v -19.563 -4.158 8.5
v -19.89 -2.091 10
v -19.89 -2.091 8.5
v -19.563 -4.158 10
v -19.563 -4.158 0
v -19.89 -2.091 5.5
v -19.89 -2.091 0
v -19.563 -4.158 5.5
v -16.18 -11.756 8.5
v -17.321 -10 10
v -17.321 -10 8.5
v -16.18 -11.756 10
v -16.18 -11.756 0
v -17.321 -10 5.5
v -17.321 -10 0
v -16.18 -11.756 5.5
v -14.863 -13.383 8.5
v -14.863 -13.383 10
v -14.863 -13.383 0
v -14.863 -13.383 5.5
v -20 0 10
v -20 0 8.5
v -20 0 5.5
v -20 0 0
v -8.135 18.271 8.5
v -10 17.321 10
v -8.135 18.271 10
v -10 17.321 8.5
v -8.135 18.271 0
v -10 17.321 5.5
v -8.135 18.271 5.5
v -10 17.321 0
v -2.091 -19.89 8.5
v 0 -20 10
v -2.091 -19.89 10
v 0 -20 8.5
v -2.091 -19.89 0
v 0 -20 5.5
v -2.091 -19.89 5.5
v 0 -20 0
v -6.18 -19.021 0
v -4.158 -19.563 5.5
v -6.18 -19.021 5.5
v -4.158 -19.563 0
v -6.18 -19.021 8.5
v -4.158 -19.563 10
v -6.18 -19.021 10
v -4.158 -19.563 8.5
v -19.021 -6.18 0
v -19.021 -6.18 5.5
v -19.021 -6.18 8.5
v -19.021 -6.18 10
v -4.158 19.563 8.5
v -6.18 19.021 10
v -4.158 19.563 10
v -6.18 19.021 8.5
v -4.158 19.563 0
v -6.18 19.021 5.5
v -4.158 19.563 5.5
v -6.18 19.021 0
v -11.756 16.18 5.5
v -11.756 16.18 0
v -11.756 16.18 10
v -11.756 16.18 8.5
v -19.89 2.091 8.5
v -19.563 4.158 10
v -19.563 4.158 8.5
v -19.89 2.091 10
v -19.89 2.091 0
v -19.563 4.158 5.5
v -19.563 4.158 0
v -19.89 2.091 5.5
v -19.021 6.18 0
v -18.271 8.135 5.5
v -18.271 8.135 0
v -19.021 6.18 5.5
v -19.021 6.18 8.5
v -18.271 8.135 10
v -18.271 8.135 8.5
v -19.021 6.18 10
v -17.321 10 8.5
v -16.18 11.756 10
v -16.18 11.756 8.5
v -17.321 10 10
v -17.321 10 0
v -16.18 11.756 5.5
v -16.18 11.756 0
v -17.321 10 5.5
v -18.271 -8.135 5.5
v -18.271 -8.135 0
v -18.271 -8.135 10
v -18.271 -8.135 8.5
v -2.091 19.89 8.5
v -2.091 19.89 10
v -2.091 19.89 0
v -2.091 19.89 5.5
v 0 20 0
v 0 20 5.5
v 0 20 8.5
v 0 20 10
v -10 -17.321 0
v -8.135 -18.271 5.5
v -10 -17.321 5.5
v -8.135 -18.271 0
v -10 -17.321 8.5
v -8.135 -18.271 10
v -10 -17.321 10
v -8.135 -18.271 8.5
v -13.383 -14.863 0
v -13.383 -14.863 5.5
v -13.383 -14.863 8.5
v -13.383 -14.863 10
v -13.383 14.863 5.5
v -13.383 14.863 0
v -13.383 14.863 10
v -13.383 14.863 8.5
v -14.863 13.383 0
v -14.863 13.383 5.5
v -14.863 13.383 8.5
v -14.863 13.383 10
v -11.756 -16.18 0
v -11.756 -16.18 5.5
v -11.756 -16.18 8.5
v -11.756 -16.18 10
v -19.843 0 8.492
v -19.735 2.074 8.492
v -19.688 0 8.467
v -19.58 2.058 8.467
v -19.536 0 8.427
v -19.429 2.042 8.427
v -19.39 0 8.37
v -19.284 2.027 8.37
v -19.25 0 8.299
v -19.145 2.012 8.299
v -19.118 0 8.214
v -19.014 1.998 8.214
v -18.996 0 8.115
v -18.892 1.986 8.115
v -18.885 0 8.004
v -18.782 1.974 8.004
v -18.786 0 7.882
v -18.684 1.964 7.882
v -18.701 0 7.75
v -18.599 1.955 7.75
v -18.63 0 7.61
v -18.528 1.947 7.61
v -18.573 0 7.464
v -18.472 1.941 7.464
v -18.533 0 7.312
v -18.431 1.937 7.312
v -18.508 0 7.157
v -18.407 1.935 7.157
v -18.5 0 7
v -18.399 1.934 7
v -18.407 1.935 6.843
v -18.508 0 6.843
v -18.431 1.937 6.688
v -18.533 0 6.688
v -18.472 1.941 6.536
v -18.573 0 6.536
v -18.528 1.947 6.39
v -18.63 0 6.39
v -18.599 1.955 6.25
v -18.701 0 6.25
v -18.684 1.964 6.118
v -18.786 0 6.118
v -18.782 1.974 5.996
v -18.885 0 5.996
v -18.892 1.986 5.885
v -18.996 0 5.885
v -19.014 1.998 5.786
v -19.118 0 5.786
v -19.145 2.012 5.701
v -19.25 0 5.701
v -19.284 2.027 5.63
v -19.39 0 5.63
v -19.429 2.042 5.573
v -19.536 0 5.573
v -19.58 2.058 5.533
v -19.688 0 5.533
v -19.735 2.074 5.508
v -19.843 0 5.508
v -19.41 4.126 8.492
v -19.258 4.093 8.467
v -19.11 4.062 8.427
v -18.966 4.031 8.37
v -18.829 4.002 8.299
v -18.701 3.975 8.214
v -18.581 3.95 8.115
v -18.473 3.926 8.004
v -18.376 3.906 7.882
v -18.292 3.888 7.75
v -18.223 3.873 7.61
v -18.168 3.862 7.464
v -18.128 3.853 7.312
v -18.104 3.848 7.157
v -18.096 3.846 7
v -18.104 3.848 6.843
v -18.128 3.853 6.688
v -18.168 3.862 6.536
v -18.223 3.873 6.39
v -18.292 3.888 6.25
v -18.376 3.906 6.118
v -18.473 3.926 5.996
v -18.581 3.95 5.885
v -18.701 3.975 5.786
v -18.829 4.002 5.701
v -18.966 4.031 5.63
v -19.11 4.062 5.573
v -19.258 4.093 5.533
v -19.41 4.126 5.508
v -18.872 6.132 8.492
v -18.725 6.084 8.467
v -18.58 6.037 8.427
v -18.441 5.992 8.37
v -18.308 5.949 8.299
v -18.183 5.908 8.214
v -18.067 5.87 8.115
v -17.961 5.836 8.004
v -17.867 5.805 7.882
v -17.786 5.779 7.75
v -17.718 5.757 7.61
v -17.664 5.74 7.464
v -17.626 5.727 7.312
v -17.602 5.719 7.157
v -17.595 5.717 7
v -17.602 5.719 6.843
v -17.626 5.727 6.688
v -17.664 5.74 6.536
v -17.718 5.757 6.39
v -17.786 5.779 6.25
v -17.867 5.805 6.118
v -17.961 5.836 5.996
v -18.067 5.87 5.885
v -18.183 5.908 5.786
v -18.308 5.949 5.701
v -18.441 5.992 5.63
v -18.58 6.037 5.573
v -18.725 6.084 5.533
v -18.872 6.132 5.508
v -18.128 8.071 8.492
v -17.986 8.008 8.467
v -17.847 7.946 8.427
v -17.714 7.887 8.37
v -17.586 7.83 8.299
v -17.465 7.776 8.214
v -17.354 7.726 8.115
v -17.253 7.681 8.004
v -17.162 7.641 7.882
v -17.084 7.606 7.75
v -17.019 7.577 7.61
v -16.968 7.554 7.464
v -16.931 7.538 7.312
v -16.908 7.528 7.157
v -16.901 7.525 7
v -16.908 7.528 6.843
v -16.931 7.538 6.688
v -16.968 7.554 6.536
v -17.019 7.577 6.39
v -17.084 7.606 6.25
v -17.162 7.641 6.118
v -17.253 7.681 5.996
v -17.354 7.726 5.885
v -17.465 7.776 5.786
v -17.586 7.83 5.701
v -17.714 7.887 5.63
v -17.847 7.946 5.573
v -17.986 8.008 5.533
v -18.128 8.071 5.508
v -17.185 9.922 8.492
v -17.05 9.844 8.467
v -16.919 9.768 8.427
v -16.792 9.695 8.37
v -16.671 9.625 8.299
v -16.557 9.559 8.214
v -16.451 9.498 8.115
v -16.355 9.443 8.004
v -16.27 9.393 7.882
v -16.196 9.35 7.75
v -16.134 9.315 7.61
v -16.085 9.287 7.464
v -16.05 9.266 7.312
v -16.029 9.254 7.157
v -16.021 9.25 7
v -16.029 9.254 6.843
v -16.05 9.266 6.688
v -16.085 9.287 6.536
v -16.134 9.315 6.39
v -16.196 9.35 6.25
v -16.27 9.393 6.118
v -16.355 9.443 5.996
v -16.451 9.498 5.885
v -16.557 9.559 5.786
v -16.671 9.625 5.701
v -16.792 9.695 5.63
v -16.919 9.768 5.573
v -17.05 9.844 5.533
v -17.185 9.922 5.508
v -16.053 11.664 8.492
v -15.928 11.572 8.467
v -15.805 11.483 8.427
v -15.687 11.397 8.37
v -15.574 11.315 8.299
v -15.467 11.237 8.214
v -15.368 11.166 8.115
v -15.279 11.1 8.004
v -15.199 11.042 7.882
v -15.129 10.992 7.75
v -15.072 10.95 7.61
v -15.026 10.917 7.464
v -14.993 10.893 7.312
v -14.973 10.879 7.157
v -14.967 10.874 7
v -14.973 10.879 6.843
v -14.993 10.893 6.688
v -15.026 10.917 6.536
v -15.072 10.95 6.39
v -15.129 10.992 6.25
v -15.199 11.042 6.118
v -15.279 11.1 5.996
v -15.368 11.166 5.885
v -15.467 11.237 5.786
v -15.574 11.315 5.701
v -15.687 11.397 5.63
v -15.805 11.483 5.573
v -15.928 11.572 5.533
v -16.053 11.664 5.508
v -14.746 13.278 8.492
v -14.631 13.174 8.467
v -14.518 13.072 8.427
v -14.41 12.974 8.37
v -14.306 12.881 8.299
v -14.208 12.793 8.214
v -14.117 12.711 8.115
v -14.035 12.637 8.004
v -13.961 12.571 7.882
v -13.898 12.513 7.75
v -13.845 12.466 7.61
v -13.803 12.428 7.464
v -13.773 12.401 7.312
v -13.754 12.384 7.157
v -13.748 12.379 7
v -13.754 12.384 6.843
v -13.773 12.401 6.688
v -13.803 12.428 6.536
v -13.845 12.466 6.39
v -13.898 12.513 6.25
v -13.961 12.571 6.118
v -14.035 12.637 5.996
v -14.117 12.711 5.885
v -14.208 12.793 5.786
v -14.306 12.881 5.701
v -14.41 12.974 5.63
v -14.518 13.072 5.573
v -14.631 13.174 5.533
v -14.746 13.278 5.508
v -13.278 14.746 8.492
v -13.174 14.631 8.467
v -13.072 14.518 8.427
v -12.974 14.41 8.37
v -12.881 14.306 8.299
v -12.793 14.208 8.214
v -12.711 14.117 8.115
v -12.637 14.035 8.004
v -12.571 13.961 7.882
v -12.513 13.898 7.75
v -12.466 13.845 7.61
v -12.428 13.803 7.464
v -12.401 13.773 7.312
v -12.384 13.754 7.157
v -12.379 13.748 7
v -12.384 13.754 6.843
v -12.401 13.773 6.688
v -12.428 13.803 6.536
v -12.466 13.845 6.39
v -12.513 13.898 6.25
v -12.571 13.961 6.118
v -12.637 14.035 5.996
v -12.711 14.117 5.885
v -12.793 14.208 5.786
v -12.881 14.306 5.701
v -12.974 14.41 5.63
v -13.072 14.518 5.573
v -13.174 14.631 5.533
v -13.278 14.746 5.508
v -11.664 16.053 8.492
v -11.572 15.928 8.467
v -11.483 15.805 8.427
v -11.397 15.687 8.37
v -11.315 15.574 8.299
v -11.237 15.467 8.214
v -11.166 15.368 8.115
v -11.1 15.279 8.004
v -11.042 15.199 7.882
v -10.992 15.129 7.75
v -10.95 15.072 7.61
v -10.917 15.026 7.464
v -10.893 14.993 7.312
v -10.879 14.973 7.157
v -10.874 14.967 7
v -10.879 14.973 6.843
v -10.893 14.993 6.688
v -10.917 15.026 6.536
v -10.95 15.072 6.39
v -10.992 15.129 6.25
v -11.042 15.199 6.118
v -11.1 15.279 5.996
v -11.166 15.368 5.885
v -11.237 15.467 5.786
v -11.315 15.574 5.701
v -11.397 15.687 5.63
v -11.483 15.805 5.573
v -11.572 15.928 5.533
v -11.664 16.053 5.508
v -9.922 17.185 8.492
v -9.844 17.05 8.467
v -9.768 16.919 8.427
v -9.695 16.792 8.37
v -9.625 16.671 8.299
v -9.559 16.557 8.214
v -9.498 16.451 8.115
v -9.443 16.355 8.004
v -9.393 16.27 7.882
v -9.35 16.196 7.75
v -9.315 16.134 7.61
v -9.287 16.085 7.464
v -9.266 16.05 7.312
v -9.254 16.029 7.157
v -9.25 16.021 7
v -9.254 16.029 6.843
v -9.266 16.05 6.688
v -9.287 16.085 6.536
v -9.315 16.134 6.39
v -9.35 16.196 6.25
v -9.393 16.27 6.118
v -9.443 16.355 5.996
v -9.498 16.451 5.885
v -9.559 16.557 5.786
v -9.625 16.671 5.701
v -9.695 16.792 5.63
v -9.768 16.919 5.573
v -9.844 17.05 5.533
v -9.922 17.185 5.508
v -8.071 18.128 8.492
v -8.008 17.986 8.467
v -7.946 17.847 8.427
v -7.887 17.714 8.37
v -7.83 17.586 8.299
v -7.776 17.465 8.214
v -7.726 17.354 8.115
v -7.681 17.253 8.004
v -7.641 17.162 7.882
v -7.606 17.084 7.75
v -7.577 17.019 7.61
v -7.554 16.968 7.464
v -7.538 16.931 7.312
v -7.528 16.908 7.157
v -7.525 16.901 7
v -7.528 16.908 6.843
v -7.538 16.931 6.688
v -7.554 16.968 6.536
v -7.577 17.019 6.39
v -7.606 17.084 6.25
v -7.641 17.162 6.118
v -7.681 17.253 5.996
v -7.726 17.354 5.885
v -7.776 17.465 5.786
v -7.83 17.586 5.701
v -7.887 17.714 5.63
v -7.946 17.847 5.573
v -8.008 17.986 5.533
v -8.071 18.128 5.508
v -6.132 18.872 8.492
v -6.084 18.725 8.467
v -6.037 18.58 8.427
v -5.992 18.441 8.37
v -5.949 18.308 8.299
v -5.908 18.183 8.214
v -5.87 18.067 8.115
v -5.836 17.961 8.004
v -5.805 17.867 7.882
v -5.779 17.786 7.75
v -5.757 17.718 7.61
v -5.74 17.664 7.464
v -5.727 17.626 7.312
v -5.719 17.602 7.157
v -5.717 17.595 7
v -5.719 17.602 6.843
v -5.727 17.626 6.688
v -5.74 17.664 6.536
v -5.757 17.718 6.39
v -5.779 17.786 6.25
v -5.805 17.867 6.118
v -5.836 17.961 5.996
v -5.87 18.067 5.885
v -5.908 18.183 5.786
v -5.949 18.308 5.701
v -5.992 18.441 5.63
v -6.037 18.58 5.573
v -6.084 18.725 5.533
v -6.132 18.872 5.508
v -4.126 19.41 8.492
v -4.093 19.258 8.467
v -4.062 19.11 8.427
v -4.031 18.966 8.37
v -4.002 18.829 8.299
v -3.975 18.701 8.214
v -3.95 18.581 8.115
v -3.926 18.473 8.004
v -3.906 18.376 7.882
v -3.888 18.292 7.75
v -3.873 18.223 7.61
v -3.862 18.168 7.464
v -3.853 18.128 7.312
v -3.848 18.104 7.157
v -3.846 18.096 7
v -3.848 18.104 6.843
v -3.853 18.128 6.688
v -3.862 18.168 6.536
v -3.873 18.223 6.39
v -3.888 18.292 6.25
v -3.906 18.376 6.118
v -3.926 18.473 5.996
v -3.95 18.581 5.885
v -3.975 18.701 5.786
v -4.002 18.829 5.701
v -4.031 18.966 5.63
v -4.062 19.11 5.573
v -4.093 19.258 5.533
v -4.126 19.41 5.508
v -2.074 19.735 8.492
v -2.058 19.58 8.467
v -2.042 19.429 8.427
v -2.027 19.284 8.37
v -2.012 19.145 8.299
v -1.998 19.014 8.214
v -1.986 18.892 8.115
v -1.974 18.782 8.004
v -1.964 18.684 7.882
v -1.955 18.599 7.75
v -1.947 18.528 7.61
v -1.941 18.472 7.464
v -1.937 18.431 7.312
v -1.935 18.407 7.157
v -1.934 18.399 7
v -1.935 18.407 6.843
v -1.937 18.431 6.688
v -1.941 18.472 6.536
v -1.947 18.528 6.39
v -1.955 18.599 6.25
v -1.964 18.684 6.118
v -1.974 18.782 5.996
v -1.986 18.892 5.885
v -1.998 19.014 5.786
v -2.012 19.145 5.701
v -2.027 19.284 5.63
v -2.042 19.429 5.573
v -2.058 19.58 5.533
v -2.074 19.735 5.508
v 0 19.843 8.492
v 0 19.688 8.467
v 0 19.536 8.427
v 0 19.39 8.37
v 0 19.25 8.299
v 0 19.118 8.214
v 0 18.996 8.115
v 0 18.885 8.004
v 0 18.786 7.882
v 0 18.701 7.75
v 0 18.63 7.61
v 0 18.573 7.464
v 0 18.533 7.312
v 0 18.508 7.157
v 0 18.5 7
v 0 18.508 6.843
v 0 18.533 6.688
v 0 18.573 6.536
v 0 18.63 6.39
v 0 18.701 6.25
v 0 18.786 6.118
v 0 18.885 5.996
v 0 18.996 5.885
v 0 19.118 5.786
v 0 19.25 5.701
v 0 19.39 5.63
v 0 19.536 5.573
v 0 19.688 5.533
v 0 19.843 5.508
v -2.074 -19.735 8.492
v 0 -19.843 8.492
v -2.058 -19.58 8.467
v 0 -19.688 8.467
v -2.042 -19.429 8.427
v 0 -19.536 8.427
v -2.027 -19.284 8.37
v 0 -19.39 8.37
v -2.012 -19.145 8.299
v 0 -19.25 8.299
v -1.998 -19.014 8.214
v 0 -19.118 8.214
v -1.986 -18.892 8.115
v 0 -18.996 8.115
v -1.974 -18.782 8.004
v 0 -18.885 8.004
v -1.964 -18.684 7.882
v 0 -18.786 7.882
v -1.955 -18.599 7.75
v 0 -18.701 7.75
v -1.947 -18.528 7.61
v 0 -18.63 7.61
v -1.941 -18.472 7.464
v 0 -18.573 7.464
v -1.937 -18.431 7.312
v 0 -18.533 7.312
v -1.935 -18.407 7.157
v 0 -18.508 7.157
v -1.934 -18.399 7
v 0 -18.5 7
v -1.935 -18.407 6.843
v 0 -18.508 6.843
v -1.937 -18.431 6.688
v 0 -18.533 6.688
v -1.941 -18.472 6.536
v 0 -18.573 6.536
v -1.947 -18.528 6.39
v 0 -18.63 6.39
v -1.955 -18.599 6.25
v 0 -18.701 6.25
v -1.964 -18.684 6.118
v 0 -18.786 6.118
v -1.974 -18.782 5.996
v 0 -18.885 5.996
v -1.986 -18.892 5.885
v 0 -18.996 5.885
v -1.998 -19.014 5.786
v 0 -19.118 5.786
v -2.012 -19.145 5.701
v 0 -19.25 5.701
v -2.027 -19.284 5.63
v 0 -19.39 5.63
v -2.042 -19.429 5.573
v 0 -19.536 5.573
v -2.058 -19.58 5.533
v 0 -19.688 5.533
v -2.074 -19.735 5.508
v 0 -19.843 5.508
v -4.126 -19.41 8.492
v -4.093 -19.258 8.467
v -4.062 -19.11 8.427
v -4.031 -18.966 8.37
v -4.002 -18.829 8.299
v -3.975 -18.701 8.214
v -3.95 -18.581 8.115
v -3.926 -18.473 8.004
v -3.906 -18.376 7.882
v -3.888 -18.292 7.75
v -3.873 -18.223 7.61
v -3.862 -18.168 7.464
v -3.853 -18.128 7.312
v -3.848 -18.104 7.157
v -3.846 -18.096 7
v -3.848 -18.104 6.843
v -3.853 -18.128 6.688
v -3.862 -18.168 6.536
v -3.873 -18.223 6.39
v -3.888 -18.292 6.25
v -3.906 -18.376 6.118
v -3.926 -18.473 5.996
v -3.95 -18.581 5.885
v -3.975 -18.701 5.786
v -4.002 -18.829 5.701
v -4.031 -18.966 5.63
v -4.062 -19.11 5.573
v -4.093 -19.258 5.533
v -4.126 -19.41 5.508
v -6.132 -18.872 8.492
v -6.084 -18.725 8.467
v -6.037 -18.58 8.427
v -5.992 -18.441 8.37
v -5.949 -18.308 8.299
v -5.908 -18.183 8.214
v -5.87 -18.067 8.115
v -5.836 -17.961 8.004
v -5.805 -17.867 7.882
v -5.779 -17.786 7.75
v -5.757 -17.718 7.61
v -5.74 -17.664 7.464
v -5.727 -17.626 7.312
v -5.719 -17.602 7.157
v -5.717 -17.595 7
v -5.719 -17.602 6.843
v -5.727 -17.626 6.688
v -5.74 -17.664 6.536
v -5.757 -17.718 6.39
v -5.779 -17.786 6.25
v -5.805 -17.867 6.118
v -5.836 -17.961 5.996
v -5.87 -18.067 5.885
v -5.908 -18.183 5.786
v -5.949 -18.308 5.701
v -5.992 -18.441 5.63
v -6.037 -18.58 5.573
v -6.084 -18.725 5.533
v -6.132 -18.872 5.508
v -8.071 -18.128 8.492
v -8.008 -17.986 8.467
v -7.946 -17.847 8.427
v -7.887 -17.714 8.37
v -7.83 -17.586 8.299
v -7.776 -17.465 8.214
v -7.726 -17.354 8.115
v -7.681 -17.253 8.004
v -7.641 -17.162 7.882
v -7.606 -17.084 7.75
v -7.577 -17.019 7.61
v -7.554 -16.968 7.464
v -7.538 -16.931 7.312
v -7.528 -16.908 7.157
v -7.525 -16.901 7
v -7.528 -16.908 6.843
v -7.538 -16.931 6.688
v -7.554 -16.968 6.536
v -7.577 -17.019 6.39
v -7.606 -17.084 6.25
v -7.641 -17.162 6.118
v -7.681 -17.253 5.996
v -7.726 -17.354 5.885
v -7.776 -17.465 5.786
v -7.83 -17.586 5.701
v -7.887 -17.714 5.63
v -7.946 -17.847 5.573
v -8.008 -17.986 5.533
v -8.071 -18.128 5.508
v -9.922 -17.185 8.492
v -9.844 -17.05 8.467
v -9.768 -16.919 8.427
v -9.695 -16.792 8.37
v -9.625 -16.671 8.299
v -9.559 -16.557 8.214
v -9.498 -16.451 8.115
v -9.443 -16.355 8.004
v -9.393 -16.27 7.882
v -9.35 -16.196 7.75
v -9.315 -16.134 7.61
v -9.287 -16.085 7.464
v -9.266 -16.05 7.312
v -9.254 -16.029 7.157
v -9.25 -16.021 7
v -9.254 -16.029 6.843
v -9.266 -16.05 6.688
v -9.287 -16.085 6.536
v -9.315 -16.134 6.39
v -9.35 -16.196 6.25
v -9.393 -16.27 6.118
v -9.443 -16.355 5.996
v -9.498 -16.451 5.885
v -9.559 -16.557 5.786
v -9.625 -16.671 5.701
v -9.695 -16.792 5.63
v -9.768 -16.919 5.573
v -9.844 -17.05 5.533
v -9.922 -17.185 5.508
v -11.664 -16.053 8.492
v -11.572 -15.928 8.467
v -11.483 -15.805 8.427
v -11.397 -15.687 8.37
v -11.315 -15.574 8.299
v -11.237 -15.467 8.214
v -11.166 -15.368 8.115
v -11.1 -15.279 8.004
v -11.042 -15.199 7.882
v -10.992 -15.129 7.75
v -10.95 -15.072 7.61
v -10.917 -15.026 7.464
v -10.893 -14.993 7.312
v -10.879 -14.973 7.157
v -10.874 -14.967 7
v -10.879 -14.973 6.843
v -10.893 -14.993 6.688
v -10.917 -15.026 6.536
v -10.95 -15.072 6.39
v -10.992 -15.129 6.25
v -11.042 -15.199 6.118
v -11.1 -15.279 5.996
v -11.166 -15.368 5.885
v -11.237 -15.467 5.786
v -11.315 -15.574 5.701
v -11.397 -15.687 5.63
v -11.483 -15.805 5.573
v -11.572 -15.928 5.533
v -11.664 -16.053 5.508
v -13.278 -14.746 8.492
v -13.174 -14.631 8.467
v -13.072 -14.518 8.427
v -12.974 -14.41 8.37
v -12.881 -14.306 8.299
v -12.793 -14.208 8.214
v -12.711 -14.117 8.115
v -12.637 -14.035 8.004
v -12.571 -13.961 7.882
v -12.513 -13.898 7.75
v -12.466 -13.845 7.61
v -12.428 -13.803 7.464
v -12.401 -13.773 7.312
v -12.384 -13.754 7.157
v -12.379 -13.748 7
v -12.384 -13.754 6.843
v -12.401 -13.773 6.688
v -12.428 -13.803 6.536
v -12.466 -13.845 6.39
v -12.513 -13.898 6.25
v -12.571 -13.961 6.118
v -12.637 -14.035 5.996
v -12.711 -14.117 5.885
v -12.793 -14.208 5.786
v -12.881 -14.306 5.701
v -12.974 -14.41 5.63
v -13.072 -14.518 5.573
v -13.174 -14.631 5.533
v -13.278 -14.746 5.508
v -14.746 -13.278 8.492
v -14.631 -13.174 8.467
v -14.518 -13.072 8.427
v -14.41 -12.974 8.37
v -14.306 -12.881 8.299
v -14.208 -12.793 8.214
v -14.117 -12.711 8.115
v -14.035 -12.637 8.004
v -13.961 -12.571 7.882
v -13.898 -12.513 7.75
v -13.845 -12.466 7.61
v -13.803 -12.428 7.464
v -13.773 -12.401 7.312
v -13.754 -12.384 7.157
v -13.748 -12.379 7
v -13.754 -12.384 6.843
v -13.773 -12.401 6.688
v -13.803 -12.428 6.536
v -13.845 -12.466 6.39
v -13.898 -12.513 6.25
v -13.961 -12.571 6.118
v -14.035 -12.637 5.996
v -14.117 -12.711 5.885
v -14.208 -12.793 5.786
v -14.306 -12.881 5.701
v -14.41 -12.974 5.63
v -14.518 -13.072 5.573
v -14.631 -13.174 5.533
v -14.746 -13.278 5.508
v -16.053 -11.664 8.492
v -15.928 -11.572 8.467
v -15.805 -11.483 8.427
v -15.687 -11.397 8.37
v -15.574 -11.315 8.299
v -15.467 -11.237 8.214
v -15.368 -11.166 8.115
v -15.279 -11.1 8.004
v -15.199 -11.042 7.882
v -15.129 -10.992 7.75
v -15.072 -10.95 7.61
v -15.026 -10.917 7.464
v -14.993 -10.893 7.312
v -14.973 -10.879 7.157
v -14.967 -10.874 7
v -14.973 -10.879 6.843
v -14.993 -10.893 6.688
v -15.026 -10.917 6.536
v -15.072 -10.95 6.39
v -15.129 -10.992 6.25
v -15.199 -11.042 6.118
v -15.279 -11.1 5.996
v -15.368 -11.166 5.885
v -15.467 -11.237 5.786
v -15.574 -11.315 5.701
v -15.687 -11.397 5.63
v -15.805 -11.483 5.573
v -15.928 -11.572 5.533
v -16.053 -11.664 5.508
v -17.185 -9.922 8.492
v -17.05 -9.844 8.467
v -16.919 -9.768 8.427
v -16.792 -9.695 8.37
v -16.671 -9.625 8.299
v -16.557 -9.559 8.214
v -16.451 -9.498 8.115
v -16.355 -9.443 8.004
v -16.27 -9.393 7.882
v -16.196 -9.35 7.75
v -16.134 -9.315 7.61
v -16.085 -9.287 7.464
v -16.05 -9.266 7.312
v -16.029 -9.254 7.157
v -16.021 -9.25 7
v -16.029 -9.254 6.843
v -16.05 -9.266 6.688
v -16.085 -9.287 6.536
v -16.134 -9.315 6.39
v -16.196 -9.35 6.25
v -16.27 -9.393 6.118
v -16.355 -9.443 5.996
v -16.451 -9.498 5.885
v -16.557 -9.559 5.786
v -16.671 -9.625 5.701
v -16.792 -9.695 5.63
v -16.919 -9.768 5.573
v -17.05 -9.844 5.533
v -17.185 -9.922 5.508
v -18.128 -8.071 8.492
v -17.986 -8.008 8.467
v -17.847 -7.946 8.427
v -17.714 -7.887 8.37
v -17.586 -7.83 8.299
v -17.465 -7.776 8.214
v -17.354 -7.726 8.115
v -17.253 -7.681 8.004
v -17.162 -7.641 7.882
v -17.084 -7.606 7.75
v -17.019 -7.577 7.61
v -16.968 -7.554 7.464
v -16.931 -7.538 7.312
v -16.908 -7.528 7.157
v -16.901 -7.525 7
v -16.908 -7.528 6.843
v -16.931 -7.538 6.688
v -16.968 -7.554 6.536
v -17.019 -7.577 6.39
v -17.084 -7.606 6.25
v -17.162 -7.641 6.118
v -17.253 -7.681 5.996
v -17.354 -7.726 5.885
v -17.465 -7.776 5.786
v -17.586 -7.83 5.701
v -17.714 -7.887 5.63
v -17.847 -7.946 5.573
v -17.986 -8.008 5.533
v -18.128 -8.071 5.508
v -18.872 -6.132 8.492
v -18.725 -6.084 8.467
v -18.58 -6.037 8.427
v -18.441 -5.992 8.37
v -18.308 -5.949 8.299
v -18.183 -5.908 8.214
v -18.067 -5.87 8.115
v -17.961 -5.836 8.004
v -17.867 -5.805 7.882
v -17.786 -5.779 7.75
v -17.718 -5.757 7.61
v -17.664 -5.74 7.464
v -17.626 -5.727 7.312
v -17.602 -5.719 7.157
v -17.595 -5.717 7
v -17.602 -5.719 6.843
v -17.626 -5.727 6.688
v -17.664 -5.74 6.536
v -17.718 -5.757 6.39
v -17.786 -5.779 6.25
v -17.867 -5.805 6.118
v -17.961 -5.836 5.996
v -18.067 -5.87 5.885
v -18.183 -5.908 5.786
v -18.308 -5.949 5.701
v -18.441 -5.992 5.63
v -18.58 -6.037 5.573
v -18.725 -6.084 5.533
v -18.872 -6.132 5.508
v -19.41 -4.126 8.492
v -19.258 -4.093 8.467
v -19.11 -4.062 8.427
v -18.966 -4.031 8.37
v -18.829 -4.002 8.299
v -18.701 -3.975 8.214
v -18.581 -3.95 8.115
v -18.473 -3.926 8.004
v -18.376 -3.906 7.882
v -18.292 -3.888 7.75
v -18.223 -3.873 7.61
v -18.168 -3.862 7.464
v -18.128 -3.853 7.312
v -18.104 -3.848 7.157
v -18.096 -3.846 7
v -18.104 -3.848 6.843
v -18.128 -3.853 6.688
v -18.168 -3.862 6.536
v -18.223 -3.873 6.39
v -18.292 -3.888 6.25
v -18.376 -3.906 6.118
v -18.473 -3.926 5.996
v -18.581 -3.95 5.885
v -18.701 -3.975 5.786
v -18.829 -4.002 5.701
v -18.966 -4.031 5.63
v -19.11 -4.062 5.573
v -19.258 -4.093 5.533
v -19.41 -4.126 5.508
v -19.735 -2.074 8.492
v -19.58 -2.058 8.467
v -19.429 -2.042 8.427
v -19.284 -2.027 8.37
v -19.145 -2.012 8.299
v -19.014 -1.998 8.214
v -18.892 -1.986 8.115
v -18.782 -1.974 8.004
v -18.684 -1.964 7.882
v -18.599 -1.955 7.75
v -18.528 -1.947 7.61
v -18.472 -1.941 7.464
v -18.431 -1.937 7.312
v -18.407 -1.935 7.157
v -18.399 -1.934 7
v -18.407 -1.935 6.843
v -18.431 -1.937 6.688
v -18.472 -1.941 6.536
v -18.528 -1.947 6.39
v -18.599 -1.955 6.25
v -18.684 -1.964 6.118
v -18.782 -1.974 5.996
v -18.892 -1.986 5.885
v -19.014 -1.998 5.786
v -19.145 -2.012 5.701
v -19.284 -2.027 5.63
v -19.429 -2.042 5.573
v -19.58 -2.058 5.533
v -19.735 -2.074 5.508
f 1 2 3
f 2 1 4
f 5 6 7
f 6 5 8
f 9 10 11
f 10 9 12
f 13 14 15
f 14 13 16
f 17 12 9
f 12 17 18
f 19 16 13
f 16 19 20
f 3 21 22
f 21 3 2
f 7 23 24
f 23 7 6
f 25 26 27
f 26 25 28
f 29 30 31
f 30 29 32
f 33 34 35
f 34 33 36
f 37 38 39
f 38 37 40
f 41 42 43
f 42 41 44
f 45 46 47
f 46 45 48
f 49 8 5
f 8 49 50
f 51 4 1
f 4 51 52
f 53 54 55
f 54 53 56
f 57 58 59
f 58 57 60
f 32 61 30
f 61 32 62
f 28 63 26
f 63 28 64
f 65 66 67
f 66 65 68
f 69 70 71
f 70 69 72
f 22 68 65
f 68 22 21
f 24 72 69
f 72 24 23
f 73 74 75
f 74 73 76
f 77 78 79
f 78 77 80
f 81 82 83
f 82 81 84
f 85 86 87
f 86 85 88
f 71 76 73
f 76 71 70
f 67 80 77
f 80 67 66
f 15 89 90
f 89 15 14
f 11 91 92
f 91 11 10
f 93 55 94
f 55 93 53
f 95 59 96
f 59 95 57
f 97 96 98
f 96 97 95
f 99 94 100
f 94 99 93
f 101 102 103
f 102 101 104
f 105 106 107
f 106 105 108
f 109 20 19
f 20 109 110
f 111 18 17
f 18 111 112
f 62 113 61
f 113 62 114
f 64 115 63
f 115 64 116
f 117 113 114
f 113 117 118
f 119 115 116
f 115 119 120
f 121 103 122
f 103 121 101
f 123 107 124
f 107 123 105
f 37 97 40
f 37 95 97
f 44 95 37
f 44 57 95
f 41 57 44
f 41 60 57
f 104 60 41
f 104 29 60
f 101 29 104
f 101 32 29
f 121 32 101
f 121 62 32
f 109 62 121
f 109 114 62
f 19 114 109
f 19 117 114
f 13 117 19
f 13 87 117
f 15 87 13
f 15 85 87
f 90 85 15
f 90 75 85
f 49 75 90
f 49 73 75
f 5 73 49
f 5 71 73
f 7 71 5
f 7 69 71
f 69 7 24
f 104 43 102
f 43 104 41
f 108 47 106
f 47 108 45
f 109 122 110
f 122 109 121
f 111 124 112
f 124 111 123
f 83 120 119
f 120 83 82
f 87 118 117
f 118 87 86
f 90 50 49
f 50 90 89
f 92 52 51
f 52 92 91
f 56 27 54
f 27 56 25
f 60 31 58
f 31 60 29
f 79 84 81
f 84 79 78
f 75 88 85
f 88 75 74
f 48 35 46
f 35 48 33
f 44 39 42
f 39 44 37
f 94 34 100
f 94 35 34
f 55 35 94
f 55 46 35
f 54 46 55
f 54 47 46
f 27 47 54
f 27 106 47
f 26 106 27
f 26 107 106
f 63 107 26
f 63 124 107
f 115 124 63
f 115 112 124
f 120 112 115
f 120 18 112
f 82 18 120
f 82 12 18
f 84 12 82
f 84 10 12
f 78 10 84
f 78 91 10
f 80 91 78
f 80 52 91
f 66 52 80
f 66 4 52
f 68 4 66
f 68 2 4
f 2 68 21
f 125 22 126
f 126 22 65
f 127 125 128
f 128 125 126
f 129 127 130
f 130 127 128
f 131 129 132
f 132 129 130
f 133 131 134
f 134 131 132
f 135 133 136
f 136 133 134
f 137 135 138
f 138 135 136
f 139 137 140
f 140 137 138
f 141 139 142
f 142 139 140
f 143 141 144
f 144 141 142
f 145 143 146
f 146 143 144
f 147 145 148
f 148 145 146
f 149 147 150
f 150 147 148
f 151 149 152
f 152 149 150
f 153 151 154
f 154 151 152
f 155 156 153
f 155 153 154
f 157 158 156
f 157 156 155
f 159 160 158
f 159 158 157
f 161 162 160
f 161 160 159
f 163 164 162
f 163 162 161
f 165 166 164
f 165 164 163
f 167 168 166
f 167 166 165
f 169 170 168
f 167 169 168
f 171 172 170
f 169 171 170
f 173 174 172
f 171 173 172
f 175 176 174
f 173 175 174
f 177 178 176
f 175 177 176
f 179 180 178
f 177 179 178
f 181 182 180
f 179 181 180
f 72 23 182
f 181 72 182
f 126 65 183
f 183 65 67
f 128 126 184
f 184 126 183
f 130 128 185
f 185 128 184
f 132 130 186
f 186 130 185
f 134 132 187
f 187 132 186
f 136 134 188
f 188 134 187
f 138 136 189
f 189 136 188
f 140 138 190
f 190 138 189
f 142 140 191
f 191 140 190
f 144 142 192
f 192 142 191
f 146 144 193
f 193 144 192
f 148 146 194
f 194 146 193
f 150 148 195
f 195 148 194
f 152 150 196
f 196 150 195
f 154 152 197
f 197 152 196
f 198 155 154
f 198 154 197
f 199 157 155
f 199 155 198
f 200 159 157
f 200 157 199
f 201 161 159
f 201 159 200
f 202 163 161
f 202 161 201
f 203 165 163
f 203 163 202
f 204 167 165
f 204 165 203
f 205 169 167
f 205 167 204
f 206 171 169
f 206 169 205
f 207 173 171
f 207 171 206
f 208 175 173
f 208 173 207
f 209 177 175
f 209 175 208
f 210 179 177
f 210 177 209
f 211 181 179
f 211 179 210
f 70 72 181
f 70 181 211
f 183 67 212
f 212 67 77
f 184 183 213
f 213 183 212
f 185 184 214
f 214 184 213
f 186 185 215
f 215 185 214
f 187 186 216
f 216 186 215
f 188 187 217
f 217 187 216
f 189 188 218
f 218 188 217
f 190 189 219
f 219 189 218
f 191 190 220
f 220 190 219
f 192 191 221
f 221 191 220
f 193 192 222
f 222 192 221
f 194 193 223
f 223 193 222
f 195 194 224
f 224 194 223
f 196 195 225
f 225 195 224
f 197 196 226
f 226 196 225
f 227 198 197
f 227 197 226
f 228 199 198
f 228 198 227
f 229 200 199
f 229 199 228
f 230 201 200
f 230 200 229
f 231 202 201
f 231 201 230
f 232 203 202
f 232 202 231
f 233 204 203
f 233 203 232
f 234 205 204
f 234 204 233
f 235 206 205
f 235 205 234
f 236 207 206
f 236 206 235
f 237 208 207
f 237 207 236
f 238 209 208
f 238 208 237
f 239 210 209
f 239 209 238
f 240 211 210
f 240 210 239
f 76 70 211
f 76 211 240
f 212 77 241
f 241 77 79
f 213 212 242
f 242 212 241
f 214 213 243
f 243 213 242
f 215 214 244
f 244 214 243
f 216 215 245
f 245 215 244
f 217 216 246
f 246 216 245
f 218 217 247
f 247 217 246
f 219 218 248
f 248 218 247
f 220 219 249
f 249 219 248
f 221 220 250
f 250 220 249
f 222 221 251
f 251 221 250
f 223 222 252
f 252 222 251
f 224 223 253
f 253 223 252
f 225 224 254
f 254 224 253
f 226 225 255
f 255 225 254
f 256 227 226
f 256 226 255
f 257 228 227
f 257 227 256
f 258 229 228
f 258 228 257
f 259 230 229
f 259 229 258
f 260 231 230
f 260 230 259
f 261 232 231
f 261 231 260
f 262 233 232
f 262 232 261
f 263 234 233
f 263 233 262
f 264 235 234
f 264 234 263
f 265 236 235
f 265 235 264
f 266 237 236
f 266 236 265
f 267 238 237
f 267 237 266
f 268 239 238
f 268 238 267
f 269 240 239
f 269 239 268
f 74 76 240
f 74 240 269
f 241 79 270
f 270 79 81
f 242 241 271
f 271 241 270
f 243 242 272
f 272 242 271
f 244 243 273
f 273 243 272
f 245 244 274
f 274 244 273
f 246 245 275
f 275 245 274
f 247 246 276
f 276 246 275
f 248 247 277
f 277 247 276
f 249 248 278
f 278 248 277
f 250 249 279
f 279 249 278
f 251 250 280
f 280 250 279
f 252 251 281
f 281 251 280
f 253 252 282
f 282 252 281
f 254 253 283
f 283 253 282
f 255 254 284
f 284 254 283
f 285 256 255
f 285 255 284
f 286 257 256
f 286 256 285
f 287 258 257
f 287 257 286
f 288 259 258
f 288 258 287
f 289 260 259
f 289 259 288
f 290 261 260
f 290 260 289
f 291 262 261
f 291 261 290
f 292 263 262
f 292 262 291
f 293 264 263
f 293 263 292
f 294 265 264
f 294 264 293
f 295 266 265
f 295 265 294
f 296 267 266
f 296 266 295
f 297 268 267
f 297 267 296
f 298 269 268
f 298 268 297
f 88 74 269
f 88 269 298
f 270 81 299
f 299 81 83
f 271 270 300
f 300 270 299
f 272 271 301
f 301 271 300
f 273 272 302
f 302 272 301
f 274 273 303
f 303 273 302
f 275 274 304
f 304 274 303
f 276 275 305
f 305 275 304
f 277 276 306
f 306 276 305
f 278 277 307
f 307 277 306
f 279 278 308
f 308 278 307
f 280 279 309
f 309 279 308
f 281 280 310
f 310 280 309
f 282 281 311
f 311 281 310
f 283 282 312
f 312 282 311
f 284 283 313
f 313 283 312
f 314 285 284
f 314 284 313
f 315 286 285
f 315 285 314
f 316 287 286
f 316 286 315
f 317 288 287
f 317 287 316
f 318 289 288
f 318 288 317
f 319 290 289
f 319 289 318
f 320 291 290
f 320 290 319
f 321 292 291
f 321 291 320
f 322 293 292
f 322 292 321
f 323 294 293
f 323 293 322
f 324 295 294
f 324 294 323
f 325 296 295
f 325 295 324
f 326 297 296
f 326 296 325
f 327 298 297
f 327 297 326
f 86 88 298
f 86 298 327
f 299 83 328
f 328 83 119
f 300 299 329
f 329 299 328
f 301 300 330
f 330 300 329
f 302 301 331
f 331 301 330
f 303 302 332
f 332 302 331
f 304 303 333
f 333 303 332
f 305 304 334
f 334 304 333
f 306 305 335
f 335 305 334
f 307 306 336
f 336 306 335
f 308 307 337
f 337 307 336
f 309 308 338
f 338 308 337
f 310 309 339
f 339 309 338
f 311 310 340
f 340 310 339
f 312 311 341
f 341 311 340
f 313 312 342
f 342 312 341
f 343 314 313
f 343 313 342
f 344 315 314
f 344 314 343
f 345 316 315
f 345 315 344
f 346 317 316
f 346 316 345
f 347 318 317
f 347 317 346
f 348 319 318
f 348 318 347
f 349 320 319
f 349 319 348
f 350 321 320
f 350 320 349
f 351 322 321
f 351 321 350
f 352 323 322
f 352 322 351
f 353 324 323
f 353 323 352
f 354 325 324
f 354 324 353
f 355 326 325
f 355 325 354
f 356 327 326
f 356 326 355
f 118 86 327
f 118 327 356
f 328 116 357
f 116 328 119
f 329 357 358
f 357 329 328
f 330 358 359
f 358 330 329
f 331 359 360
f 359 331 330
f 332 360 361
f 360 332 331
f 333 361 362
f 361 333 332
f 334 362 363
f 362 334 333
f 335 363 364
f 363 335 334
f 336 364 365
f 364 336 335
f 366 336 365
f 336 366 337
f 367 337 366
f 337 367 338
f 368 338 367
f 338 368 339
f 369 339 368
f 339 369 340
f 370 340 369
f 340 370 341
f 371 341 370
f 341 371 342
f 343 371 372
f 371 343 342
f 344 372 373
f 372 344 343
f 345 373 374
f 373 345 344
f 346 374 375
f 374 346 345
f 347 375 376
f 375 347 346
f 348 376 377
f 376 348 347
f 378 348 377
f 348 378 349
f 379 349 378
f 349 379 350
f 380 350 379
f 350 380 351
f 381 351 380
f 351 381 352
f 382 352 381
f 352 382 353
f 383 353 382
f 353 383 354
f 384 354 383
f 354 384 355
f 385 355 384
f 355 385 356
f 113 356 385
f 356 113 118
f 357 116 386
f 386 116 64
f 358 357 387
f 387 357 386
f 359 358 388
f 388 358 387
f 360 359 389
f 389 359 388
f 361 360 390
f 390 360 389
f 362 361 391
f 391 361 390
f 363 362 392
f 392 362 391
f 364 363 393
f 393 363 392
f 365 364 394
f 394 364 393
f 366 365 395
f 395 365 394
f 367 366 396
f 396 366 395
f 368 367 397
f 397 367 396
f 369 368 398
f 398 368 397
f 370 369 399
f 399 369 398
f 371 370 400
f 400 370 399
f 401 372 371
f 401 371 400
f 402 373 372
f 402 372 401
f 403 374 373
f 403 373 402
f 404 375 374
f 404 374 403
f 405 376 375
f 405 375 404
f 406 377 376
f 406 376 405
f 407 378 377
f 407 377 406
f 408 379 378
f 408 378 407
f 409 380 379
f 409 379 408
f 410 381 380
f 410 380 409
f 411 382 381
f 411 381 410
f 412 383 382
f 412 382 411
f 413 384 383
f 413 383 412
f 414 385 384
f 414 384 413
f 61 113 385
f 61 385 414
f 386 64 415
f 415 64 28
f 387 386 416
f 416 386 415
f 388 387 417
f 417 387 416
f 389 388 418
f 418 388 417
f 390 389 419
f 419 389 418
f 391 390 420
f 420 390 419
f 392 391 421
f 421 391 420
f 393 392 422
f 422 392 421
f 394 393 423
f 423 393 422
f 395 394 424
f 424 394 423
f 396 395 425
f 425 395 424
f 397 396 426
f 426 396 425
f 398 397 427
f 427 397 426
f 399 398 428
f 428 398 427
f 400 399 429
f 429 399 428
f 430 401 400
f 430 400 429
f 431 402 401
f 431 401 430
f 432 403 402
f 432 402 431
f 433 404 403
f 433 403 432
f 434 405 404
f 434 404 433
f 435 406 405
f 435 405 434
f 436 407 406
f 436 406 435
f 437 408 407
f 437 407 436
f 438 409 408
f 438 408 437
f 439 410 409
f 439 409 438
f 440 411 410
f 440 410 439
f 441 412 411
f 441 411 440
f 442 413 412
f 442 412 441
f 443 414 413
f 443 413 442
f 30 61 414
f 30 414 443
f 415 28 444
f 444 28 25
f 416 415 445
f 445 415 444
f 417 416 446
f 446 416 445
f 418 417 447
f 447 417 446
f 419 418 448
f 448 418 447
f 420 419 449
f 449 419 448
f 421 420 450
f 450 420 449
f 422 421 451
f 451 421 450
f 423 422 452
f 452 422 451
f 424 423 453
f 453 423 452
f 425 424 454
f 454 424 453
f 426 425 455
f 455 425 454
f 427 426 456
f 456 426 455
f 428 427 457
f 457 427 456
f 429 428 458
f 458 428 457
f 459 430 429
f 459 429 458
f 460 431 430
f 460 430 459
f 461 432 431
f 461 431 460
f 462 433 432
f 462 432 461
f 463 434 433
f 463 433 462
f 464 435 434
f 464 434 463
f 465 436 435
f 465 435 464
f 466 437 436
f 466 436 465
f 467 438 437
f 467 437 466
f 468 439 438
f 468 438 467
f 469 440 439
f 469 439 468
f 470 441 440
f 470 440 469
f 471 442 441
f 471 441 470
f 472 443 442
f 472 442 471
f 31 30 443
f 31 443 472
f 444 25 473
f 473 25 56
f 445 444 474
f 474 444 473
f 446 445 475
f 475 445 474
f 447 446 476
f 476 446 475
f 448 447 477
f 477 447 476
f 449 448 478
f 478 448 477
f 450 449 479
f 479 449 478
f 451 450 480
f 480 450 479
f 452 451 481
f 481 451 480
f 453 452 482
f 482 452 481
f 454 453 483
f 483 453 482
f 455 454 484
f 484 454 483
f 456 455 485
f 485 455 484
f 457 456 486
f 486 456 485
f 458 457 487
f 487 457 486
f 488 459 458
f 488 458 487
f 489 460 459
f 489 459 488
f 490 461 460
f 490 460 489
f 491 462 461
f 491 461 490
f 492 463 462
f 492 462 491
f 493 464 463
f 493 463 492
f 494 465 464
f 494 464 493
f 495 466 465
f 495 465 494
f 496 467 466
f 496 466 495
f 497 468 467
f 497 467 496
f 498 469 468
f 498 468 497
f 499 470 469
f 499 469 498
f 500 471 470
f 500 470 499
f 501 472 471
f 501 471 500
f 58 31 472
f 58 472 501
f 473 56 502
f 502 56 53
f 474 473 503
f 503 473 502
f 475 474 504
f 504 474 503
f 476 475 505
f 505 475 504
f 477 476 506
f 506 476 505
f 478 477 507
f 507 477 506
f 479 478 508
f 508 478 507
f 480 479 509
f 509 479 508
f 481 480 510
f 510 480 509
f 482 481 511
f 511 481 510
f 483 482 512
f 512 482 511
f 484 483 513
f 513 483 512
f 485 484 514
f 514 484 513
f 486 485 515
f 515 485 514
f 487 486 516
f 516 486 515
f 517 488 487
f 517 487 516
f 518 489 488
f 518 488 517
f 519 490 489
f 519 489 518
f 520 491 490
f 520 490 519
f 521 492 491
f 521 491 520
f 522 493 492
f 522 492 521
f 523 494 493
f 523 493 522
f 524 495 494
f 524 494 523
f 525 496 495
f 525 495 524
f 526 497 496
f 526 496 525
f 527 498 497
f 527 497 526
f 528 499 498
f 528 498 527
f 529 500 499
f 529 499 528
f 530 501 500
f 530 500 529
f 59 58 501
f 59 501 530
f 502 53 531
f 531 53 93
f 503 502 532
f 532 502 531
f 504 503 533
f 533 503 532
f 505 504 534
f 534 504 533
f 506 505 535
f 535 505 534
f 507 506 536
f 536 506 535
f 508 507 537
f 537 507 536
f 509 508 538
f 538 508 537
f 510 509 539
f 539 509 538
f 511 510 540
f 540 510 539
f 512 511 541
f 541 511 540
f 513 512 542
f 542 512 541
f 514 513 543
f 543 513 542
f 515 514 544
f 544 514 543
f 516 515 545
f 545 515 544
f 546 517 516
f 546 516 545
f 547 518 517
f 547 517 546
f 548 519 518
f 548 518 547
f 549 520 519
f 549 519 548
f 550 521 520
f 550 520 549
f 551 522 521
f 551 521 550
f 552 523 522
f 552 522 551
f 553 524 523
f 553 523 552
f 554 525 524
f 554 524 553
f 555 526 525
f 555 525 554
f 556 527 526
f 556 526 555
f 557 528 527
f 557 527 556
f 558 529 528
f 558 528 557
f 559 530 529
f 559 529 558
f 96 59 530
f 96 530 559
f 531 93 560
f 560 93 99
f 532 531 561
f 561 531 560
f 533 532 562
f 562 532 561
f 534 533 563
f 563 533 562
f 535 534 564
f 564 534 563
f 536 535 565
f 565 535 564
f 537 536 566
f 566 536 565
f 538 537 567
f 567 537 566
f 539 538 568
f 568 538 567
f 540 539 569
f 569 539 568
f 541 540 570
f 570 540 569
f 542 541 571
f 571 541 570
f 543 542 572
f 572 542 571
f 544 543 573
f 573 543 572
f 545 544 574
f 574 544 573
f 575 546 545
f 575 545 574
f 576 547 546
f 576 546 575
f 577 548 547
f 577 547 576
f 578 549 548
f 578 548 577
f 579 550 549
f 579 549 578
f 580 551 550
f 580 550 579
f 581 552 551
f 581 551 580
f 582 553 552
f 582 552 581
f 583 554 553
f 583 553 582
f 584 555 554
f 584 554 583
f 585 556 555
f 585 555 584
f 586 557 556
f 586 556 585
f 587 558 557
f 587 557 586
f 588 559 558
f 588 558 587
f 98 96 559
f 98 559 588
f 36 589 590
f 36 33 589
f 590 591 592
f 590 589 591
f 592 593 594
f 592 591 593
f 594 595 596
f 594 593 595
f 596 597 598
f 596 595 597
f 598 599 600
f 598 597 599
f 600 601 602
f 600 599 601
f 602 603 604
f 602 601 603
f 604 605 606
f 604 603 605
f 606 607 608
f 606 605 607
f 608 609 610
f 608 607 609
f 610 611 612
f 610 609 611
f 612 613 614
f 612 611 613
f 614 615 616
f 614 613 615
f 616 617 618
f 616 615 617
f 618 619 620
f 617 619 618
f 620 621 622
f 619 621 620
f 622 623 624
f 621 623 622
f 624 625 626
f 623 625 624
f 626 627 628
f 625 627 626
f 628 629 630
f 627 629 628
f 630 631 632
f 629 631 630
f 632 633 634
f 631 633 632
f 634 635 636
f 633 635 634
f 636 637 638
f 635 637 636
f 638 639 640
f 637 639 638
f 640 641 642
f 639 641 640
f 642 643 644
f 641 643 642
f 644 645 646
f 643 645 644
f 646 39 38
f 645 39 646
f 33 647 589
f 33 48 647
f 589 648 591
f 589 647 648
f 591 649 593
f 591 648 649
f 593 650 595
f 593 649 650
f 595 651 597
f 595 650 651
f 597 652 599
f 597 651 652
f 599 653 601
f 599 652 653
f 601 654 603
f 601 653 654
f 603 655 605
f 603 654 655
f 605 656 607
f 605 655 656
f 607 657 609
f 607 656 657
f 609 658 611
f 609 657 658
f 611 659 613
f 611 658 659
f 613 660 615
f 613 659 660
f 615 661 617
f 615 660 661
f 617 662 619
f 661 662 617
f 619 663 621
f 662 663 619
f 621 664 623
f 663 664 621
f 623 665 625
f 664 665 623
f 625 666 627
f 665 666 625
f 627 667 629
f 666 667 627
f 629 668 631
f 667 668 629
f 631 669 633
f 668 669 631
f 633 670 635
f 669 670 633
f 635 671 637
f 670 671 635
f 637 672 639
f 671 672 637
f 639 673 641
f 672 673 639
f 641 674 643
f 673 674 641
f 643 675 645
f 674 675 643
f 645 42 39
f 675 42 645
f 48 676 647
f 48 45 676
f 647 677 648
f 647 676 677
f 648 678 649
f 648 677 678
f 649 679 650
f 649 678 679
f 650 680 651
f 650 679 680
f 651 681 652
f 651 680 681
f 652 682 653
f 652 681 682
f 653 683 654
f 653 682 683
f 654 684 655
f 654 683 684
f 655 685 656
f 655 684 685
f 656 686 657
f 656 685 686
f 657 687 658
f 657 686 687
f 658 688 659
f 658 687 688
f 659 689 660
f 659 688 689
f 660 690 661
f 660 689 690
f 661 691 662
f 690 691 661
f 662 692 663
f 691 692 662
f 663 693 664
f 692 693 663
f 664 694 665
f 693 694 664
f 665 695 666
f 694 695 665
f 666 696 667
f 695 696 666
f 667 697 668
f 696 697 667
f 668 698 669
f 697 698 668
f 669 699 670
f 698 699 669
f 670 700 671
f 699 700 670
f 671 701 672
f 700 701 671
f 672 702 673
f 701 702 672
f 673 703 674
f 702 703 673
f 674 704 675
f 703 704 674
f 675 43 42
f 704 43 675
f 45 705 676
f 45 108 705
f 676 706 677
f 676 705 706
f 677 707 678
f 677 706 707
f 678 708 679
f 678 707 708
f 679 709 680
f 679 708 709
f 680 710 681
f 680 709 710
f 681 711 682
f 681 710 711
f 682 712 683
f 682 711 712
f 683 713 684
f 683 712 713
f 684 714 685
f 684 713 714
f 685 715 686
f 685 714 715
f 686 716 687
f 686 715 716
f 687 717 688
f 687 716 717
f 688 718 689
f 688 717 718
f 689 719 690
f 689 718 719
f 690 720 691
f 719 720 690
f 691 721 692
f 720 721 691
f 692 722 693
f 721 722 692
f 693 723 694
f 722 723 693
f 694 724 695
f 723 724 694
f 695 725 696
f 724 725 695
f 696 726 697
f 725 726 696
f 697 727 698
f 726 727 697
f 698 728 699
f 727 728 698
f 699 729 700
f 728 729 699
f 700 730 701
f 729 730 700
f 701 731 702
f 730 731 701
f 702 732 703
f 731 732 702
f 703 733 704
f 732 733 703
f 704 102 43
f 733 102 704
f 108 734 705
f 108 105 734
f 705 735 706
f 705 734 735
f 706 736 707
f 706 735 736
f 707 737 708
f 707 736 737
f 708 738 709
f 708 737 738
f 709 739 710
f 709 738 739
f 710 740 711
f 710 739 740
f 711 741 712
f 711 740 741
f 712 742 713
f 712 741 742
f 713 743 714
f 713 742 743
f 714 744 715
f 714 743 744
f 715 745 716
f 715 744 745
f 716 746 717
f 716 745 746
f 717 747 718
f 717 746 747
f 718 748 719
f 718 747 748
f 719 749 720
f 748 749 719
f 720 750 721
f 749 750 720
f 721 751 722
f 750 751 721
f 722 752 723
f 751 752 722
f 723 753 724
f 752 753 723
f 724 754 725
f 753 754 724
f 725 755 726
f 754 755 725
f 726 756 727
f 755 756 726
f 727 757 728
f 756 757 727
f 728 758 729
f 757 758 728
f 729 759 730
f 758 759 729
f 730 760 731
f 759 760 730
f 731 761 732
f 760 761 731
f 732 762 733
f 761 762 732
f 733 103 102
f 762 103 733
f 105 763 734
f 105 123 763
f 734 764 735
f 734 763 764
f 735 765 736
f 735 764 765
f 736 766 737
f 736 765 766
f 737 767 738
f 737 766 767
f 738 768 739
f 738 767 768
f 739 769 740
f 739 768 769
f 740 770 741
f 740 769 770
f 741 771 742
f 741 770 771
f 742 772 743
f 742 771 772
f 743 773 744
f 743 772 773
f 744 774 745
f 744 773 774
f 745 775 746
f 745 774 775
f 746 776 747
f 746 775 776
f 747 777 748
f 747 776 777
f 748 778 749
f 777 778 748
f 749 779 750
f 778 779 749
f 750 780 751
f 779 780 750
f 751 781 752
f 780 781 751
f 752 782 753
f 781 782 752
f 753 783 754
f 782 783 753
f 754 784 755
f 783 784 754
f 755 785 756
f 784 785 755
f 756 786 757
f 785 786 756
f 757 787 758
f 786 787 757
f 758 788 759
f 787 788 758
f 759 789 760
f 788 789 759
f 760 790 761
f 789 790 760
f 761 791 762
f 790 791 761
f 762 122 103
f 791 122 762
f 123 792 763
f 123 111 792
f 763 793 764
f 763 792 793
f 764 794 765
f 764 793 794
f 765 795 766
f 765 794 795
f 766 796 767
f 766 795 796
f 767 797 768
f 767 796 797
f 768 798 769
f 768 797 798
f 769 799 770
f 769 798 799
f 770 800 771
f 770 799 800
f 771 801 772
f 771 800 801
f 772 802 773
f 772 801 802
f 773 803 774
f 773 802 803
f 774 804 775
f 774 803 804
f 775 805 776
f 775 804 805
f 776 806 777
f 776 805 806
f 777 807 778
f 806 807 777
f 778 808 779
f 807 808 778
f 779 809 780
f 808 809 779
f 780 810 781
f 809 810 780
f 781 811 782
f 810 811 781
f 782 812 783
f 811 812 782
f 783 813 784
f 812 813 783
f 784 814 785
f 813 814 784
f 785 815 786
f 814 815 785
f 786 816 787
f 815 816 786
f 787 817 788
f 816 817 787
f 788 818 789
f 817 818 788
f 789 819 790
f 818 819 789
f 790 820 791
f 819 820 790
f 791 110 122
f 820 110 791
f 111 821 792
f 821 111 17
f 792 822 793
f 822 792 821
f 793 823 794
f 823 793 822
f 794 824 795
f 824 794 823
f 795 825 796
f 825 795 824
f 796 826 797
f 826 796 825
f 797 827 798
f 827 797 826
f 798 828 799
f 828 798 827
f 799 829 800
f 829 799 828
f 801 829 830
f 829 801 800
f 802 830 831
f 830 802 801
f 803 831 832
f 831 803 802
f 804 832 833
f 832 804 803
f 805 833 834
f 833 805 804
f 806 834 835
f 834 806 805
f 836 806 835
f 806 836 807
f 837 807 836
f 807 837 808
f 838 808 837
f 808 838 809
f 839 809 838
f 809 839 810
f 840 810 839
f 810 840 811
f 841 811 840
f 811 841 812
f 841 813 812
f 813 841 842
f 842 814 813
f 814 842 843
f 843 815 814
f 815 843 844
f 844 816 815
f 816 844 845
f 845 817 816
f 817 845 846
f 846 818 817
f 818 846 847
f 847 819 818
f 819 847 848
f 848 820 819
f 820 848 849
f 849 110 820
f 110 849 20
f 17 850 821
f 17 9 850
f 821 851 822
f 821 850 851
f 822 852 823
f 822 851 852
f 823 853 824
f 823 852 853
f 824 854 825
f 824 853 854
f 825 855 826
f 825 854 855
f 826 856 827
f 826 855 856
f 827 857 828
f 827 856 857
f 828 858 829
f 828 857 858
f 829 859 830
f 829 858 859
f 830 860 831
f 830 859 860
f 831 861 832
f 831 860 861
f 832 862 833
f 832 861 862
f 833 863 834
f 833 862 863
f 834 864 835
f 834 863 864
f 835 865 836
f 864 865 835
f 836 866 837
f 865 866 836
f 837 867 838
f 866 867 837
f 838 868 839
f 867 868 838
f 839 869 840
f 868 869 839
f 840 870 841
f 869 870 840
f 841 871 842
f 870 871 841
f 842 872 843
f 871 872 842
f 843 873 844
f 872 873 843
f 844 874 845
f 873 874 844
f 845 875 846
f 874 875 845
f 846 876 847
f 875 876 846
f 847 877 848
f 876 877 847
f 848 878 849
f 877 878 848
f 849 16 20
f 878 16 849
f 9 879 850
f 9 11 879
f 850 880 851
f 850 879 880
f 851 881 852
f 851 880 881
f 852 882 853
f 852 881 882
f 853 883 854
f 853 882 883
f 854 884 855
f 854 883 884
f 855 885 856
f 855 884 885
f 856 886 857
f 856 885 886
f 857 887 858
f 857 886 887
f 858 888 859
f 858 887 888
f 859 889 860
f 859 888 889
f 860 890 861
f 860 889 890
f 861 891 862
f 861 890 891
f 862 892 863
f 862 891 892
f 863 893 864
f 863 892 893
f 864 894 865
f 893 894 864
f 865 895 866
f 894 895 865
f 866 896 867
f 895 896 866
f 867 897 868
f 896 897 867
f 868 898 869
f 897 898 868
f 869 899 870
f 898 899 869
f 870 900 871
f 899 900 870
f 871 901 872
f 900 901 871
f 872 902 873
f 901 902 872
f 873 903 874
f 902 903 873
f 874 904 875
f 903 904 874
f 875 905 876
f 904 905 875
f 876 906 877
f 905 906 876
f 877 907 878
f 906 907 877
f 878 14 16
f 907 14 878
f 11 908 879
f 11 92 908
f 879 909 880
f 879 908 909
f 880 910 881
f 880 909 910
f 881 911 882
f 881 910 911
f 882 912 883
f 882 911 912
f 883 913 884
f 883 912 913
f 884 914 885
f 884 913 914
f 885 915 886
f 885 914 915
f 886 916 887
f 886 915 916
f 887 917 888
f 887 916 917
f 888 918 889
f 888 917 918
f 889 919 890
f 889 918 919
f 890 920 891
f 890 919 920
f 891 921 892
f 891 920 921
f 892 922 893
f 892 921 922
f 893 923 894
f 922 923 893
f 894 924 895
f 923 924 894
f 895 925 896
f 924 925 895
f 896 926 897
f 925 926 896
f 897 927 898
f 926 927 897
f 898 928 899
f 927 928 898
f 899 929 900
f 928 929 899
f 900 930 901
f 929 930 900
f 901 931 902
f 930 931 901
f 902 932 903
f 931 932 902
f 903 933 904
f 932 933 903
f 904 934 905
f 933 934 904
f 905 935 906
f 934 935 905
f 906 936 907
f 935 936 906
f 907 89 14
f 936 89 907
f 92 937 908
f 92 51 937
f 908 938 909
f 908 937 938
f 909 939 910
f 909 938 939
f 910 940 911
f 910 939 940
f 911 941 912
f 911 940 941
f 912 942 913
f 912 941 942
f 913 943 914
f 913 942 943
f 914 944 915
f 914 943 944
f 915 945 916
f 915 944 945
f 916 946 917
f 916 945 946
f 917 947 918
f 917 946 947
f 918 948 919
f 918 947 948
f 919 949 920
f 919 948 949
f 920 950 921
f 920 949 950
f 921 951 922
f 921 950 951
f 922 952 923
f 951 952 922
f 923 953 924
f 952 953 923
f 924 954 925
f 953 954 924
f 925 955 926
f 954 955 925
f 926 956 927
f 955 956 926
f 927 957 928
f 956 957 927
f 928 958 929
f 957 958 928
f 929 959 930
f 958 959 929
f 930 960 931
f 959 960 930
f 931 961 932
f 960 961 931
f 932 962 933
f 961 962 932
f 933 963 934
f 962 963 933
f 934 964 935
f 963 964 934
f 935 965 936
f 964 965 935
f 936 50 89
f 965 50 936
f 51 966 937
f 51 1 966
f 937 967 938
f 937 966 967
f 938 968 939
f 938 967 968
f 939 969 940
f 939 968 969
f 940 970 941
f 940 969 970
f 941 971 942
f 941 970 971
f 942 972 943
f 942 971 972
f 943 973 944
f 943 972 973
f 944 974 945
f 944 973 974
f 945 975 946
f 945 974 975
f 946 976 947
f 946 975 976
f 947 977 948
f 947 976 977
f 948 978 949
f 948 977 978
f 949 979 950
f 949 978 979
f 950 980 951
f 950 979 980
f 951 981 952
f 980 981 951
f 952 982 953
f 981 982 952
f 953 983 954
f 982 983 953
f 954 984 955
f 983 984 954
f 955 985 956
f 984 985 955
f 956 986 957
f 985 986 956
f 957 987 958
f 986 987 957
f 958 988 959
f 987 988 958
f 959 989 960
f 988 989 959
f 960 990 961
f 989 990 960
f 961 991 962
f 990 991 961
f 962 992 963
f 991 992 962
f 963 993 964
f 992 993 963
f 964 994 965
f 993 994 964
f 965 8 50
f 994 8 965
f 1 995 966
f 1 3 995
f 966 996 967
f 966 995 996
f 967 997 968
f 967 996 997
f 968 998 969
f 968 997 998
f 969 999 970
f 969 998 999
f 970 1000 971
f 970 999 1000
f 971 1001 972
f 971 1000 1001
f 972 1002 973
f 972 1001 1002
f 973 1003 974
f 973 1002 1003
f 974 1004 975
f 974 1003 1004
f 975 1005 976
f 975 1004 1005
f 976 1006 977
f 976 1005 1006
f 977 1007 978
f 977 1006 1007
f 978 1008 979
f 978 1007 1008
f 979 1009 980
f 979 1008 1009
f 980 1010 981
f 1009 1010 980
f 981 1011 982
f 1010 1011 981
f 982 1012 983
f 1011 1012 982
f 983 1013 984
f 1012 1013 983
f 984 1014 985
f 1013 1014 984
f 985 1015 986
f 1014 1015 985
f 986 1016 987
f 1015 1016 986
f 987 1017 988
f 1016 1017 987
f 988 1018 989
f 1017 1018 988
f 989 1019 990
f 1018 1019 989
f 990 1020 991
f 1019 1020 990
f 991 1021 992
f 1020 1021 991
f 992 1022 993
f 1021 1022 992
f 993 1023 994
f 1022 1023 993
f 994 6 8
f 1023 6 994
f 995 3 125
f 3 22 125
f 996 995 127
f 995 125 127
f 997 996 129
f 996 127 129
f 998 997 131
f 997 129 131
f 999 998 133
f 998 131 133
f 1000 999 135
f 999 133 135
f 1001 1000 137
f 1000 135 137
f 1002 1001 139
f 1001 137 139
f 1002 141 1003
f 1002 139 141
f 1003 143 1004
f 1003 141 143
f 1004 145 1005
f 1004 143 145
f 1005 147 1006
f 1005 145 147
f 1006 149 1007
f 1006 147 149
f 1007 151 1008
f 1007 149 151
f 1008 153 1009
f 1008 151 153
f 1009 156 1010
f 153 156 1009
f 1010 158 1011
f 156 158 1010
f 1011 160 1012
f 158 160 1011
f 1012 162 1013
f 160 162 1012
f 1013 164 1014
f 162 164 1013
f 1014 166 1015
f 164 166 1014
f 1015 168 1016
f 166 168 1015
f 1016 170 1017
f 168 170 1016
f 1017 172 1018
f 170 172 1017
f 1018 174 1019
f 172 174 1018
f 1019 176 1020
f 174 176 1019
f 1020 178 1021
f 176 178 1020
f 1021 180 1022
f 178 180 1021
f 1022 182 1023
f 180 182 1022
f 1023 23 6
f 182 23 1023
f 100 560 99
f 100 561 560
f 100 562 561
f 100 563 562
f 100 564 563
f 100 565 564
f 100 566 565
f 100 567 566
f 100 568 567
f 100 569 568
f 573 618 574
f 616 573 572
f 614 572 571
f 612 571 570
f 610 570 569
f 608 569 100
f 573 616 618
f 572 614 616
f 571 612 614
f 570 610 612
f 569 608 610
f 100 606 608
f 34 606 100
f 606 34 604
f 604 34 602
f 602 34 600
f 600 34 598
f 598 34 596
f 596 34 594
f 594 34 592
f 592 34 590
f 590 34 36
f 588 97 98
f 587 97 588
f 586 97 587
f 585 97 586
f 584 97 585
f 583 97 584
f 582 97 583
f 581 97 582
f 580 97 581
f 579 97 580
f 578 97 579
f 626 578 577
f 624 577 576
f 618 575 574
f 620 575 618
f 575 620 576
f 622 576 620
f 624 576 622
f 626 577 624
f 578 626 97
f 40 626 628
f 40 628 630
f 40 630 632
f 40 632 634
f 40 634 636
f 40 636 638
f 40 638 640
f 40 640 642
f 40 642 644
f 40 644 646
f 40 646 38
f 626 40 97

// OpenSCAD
$fn=60;

difference() {
cylinder(d=40, h=10);

translate([0, 0, 7])
rotate_extrude(convexity = 10)
translate([20, 0, 0])
circle(d = 3);
  
  translate([0, -25, -0.1])
  cube(50);
}
